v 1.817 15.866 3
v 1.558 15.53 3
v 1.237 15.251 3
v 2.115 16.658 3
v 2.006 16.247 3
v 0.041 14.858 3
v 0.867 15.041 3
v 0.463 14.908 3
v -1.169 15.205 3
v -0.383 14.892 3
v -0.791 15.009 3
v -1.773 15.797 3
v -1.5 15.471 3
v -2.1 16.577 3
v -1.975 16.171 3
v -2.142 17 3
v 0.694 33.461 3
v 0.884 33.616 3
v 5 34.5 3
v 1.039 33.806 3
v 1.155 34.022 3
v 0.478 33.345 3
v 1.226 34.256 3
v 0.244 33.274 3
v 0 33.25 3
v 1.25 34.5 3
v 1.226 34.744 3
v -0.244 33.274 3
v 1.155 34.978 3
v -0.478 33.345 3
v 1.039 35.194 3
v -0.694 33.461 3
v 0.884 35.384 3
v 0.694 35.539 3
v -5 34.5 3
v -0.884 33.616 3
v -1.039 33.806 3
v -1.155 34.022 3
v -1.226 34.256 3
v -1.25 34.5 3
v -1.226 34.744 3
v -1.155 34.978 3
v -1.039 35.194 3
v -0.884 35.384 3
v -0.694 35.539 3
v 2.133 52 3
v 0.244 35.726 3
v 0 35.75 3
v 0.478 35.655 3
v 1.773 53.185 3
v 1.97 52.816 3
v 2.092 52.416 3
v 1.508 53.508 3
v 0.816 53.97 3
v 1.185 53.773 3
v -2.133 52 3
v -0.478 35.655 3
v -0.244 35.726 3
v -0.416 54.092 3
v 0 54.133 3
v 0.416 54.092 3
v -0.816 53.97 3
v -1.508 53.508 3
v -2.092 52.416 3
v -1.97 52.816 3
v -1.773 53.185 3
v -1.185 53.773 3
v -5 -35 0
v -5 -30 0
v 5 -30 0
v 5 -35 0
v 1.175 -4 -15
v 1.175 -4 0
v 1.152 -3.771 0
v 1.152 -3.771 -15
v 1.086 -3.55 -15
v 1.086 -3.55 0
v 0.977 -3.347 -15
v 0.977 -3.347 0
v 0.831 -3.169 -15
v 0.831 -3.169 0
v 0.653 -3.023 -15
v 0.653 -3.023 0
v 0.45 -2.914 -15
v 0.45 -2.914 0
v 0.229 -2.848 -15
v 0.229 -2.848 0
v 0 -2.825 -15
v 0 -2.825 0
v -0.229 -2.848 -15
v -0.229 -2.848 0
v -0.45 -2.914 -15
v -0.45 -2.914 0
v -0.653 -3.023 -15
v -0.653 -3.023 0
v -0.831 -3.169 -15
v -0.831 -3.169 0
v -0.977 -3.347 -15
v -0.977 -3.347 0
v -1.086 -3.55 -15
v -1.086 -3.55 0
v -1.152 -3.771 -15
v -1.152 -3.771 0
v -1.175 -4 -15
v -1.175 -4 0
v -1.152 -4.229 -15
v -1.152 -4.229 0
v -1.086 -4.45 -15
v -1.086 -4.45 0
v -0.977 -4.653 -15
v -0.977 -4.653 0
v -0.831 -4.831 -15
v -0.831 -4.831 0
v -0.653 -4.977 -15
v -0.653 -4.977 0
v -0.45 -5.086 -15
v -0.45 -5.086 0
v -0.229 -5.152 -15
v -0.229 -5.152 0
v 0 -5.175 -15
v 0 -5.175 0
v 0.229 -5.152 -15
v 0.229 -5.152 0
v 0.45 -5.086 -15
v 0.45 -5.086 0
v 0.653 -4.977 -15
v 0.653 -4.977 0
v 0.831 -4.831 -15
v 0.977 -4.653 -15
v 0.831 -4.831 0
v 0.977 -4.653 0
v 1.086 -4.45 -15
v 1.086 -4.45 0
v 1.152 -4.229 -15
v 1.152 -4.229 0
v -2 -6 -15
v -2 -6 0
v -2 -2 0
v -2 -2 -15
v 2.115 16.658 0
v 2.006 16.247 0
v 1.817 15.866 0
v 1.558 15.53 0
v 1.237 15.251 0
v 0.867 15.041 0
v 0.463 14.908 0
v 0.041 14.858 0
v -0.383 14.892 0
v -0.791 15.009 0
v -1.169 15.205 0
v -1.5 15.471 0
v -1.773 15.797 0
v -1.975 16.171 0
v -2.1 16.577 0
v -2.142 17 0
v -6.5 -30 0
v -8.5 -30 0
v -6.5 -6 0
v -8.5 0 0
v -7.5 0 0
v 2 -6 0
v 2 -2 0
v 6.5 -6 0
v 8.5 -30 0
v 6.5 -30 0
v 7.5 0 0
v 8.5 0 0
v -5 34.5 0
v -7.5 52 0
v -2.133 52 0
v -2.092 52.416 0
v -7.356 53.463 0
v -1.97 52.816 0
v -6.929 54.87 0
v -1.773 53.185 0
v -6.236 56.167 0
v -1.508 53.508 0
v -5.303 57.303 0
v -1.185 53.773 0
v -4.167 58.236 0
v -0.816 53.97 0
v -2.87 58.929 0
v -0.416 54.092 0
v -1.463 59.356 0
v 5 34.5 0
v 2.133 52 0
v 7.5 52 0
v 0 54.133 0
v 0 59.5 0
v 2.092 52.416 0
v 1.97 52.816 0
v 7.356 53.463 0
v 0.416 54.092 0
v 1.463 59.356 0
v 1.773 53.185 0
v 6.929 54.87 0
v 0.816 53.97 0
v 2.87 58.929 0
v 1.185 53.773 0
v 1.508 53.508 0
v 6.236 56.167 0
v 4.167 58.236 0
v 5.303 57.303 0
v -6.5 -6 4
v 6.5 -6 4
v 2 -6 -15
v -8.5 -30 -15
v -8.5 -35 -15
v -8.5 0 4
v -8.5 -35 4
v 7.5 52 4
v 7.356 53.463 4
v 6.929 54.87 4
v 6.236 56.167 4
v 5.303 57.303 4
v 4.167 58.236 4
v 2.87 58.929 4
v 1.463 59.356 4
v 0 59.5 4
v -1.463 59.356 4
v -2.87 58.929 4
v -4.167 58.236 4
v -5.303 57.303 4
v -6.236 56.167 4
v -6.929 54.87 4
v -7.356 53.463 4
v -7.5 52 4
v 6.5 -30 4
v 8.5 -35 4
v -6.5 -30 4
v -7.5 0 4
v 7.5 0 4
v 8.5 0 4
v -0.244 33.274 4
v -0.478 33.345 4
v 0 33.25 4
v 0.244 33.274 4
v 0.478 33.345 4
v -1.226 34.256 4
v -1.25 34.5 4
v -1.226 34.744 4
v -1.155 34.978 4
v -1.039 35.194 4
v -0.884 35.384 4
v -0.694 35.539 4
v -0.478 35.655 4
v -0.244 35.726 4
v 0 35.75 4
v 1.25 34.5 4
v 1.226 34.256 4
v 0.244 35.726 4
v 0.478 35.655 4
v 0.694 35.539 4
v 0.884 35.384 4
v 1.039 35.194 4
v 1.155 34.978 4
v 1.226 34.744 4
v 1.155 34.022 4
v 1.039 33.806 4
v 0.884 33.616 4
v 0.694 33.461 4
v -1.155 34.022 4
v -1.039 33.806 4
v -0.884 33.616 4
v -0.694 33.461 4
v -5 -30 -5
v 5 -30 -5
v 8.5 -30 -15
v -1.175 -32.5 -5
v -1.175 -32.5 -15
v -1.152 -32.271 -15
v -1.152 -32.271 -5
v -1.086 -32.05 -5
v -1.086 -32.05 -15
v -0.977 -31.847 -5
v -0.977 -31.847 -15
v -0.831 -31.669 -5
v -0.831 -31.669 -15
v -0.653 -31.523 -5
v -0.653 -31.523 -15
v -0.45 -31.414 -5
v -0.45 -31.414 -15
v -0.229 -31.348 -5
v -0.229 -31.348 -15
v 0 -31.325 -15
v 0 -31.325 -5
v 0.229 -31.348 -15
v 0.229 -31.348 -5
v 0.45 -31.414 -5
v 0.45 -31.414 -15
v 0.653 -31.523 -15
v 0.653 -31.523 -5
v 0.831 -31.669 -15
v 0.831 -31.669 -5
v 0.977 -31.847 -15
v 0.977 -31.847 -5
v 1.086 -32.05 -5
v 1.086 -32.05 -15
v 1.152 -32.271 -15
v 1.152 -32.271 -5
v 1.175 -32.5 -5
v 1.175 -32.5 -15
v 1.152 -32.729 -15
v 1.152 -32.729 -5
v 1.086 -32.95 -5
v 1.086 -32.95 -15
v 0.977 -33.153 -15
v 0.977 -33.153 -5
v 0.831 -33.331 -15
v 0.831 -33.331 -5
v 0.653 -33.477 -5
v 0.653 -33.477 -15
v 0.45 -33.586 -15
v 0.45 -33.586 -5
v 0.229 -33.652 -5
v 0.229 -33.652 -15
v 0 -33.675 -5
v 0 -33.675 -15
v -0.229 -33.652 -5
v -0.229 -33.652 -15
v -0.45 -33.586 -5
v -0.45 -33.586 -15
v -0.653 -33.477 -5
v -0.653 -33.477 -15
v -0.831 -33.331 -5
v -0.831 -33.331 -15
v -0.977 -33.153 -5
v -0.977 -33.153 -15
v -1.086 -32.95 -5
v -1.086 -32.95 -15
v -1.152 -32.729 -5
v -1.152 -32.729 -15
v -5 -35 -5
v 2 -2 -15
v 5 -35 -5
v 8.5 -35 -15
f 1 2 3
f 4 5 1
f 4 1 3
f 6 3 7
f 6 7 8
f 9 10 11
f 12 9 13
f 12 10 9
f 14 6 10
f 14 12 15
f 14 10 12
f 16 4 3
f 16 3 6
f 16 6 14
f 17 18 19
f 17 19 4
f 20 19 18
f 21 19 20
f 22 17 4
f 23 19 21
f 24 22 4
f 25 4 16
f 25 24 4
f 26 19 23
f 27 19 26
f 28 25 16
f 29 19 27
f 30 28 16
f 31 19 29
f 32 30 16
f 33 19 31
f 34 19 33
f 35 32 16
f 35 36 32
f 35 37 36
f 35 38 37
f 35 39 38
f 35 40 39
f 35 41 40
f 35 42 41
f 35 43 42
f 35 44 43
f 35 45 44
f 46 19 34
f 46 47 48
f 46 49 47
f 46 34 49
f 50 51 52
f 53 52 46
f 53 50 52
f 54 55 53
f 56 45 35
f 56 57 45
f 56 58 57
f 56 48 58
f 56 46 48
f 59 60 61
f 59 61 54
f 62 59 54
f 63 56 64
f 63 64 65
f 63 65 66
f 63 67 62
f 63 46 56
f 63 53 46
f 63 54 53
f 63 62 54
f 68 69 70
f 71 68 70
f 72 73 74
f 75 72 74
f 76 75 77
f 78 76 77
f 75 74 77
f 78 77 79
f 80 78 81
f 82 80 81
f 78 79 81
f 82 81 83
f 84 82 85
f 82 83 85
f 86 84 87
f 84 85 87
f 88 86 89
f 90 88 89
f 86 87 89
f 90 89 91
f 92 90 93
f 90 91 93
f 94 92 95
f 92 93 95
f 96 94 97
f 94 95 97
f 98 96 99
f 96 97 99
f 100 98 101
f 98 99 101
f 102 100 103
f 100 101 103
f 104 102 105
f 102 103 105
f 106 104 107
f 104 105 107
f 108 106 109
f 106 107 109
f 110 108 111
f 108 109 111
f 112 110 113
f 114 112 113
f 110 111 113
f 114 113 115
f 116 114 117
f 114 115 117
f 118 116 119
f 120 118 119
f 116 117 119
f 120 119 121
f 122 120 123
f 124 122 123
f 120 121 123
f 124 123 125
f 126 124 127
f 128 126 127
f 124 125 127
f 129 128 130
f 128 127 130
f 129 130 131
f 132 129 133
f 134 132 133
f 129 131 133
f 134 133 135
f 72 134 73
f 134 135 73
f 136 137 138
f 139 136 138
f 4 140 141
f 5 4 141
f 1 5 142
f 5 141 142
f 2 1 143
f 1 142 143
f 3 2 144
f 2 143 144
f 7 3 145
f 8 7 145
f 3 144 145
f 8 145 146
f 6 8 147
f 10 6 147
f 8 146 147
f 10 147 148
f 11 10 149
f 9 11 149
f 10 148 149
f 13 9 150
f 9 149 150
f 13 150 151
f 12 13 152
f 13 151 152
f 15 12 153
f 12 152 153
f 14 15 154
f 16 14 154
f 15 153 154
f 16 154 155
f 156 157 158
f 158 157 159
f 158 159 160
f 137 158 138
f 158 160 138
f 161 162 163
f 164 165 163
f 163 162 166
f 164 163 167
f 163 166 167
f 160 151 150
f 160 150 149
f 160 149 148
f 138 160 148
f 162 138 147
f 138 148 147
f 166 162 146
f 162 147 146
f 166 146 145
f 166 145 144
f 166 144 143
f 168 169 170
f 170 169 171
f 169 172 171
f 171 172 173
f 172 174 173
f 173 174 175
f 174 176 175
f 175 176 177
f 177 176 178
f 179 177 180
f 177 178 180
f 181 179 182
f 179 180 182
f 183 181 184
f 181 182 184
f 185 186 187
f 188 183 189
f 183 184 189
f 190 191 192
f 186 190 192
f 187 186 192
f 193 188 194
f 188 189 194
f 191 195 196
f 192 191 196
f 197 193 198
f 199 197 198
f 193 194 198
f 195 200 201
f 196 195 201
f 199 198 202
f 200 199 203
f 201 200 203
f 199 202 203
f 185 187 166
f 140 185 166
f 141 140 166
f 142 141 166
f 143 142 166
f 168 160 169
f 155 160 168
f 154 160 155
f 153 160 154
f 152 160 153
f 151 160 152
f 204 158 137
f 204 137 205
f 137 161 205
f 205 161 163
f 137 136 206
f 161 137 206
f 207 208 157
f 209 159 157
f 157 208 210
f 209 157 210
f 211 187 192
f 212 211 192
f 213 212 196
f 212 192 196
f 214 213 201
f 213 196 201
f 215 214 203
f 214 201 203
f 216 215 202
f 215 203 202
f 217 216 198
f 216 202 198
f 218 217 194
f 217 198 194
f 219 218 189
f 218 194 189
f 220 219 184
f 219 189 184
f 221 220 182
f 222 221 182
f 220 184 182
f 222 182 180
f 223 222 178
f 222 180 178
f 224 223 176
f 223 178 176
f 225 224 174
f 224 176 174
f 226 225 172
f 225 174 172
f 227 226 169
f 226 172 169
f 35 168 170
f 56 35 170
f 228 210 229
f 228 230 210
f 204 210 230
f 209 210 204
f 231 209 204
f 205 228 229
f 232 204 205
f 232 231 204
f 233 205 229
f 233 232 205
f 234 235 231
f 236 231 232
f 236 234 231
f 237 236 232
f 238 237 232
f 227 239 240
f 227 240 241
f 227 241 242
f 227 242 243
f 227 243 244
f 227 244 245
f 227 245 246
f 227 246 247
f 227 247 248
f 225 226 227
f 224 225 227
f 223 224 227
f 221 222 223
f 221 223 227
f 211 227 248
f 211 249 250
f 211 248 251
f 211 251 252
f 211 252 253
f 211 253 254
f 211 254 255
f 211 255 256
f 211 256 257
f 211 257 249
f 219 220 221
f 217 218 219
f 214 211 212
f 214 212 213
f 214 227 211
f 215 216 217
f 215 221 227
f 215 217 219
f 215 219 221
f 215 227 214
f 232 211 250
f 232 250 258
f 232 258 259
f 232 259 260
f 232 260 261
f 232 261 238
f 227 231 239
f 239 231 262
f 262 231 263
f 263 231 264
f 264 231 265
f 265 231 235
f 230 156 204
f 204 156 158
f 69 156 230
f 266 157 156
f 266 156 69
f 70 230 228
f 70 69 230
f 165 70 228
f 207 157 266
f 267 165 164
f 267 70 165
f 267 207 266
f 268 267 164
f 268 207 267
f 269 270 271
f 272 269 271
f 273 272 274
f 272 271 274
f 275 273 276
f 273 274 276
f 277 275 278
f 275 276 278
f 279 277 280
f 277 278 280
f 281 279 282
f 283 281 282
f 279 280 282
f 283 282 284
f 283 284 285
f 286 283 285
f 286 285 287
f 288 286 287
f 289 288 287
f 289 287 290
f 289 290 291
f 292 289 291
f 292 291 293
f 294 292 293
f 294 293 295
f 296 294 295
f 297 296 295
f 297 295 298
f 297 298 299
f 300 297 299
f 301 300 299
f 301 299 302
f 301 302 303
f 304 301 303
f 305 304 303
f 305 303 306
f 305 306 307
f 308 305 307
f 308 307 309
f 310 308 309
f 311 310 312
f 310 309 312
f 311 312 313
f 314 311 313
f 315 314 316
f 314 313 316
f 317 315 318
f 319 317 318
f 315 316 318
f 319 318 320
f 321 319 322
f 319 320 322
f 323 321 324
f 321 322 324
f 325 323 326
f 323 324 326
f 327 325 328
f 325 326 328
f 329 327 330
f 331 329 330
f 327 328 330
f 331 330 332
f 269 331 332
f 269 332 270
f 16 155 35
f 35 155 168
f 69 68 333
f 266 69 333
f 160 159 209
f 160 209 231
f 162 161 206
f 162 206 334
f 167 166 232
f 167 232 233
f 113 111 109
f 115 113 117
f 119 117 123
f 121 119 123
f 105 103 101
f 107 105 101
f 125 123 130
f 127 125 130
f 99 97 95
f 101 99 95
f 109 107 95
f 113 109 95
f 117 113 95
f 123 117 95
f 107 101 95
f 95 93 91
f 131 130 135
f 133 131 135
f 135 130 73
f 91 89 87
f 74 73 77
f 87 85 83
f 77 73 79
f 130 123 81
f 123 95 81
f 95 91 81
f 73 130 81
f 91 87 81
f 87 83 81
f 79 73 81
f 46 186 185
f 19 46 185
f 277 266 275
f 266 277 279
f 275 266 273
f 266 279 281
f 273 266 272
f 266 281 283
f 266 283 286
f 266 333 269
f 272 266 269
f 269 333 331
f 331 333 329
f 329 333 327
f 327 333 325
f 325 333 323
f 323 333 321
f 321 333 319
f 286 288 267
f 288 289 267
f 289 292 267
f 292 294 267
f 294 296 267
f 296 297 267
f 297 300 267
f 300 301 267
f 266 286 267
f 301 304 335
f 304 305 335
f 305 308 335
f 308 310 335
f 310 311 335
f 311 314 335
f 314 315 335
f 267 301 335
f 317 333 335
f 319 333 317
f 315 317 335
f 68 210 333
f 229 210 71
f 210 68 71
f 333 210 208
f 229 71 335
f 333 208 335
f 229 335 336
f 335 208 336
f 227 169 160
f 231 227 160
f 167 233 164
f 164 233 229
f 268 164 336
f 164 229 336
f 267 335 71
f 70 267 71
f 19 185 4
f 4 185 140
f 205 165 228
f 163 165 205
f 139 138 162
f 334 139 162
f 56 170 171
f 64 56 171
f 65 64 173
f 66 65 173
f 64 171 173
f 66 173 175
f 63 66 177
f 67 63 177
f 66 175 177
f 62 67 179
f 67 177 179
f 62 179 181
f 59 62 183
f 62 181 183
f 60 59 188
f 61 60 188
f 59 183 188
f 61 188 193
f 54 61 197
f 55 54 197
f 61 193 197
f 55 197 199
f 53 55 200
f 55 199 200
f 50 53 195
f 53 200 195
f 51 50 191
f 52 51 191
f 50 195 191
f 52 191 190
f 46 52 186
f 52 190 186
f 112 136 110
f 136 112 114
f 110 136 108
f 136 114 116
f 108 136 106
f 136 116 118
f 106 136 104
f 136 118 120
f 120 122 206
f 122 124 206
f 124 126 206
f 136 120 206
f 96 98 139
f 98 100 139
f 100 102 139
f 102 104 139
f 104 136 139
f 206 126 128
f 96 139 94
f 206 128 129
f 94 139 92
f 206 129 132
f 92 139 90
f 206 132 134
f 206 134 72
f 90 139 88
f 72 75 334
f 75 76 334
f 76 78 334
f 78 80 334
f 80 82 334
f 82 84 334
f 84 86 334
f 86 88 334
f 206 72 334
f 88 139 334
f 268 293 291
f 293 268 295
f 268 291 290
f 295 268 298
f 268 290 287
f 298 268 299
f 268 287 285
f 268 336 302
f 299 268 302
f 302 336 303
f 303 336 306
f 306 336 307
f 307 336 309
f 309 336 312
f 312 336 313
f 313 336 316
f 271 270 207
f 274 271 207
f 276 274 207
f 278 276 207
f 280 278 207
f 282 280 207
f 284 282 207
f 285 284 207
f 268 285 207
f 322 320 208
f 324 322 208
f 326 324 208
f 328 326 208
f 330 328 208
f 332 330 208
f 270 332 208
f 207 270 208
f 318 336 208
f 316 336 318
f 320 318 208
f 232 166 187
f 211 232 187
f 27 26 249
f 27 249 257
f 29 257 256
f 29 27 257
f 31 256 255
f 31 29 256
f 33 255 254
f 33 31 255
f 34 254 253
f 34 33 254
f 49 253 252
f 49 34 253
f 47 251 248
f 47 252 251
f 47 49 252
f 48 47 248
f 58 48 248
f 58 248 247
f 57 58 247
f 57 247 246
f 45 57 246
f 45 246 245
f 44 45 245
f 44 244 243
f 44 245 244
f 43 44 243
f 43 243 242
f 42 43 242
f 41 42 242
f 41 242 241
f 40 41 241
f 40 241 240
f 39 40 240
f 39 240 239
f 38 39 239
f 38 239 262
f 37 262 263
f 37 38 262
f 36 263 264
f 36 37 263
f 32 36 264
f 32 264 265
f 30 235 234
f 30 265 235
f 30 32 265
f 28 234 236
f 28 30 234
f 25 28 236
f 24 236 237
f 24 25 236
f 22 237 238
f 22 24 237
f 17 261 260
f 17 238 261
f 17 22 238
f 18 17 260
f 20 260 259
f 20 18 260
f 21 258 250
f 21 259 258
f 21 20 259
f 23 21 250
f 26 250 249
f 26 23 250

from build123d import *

# Parameters (mm, degrees)
EXTRUDE_1_DEPTH     = 4
CUT_EXTRUDE_1_DEPTH = 3
SKETCH_5_R          = 1.25
CUT_EXTRUDE_2_DEPTH = 12.4
SKETCH_6_W          = 17
SKETCH_6_H          = 35
EXTRUDE_2_DEPTH     = 4
SKETCH_7_W          = 13
SKETCH_7_H          = 24
CUT_EXTRUDE_3_DEPTH = 12.1
SKETCH_8_W          = 4
SKETCH_8_H          = 4
SKETCH_8_R          = 1.175
EXTRUDE_3_DEPTH     = 15
EXTRUDE_4_DEPTH     = 5
SKETCH_10_R         = 1.175
CUT_EXTRUDE_4_DEPTH = 12.7


with BuildPart() as part:
    # 草圖1 → 填料-伸長1 (new body)
    with BuildSketch(Plane.XY):
        with BuildLine():
            Line((7.5, 0), (7.5, 52))
            ThreePointArc((7.5, 52), (0, 59.5), (-7.5, 52))
            Line((-7.5, 52), (-7.5, 0))
            Line((-7.5, 0), (7.5, 0))
        make_face()
    extrude(amount=EXTRUDE_1_DEPTH)

    # 草圖3 → 除料-伸長1 (cut)
    with BuildSketch(Plane.XY):
        with BuildLine():
            ThreePointArc((-2.132795501, 52), (0, 54.132795501), (2.132795501, 52))
            Line((2.132795501, 52), (5, 34.5))
            Line((5, 34.5), (2.114741289, 16.658021353))
            ThreePointArc((2.114741289, 16.658021353), (-0.171540182, 14.864665347), (-2.142213835, 17))
            Line((-2.142213835, 17), (-5, 34.5))
            Line((-5, 34.5), (-2.132795501, 52))
        make_face()
    extrude(amount=CUT_EXTRUDE_1_DEPTH, mode=Mode.SUBTRACT)

    # 草圖5 → 除料-伸長2 (cut)
    with BuildSketch(Plane.XY):
        with Locations((0, 34.5)):
            Circle(SKETCH_5_R)
    extrude(amount=CUT_EXTRUDE_2_DEPTH, mode=Mode.SUBTRACT)

    # 草圖6 → 填料-伸長2 (add)
    with BuildSketch(Plane.XY):
        with Locations((0, -17.5)):
            Rectangle(SKETCH_6_W, SKETCH_6_H)
    extrude(amount=EXTRUDE_2_DEPTH)

    # 草圖7 → 除料-伸長3 (cut)
    with BuildSketch(Plane.XY):
        with Locations((0, -18)):
            Rectangle(SKETCH_7_W, SKETCH_7_H)
    extrude(amount=CUT_EXTRUDE_3_DEPTH, mode=Mode.SUBTRACT)

    # 草圖8 → 填料-伸長3 (add)
    with BuildSketch(Plane.XY):
        with Locations((0, -4)):
            Rectangle(SKETCH_8_W, SKETCH_8_H)
        with Locations((0, -4)):
            Circle(SKETCH_8_R, mode=Mode.SUBTRACT)
    extrude(amount=-EXTRUDE_3_DEPTH)

    # 草圖9 → 填料-伸長4 (add)
    with BuildSketch(Plane(origin=(0, -35, 0), x_dir=(1, 0, 0), z_dir=(0, 1, 0))):
        Polygon((-8.5, 0), (-5, 0), (-5, 5), (5, 5), (5, 0), (8.5, 0), (8.5, 15), (-8.5, 15), align=None)
    extrude(amount=EXTRUDE_4_DEPTH)

    # 草圖10 → 除料-伸長4 (cut)
    with BuildSketch(Plane(origin=(0, 0, -15), x_dir=(-1, 0, 0), z_dir=(0, 0, -1))):
        with Locations((0, -32.5)):
            Circle(SKETCH_10_R)
    extrude(amount=-CUT_EXTRUDE_4_DEPTH, mode=Mode.SUBTRACT)


solid = part.part
